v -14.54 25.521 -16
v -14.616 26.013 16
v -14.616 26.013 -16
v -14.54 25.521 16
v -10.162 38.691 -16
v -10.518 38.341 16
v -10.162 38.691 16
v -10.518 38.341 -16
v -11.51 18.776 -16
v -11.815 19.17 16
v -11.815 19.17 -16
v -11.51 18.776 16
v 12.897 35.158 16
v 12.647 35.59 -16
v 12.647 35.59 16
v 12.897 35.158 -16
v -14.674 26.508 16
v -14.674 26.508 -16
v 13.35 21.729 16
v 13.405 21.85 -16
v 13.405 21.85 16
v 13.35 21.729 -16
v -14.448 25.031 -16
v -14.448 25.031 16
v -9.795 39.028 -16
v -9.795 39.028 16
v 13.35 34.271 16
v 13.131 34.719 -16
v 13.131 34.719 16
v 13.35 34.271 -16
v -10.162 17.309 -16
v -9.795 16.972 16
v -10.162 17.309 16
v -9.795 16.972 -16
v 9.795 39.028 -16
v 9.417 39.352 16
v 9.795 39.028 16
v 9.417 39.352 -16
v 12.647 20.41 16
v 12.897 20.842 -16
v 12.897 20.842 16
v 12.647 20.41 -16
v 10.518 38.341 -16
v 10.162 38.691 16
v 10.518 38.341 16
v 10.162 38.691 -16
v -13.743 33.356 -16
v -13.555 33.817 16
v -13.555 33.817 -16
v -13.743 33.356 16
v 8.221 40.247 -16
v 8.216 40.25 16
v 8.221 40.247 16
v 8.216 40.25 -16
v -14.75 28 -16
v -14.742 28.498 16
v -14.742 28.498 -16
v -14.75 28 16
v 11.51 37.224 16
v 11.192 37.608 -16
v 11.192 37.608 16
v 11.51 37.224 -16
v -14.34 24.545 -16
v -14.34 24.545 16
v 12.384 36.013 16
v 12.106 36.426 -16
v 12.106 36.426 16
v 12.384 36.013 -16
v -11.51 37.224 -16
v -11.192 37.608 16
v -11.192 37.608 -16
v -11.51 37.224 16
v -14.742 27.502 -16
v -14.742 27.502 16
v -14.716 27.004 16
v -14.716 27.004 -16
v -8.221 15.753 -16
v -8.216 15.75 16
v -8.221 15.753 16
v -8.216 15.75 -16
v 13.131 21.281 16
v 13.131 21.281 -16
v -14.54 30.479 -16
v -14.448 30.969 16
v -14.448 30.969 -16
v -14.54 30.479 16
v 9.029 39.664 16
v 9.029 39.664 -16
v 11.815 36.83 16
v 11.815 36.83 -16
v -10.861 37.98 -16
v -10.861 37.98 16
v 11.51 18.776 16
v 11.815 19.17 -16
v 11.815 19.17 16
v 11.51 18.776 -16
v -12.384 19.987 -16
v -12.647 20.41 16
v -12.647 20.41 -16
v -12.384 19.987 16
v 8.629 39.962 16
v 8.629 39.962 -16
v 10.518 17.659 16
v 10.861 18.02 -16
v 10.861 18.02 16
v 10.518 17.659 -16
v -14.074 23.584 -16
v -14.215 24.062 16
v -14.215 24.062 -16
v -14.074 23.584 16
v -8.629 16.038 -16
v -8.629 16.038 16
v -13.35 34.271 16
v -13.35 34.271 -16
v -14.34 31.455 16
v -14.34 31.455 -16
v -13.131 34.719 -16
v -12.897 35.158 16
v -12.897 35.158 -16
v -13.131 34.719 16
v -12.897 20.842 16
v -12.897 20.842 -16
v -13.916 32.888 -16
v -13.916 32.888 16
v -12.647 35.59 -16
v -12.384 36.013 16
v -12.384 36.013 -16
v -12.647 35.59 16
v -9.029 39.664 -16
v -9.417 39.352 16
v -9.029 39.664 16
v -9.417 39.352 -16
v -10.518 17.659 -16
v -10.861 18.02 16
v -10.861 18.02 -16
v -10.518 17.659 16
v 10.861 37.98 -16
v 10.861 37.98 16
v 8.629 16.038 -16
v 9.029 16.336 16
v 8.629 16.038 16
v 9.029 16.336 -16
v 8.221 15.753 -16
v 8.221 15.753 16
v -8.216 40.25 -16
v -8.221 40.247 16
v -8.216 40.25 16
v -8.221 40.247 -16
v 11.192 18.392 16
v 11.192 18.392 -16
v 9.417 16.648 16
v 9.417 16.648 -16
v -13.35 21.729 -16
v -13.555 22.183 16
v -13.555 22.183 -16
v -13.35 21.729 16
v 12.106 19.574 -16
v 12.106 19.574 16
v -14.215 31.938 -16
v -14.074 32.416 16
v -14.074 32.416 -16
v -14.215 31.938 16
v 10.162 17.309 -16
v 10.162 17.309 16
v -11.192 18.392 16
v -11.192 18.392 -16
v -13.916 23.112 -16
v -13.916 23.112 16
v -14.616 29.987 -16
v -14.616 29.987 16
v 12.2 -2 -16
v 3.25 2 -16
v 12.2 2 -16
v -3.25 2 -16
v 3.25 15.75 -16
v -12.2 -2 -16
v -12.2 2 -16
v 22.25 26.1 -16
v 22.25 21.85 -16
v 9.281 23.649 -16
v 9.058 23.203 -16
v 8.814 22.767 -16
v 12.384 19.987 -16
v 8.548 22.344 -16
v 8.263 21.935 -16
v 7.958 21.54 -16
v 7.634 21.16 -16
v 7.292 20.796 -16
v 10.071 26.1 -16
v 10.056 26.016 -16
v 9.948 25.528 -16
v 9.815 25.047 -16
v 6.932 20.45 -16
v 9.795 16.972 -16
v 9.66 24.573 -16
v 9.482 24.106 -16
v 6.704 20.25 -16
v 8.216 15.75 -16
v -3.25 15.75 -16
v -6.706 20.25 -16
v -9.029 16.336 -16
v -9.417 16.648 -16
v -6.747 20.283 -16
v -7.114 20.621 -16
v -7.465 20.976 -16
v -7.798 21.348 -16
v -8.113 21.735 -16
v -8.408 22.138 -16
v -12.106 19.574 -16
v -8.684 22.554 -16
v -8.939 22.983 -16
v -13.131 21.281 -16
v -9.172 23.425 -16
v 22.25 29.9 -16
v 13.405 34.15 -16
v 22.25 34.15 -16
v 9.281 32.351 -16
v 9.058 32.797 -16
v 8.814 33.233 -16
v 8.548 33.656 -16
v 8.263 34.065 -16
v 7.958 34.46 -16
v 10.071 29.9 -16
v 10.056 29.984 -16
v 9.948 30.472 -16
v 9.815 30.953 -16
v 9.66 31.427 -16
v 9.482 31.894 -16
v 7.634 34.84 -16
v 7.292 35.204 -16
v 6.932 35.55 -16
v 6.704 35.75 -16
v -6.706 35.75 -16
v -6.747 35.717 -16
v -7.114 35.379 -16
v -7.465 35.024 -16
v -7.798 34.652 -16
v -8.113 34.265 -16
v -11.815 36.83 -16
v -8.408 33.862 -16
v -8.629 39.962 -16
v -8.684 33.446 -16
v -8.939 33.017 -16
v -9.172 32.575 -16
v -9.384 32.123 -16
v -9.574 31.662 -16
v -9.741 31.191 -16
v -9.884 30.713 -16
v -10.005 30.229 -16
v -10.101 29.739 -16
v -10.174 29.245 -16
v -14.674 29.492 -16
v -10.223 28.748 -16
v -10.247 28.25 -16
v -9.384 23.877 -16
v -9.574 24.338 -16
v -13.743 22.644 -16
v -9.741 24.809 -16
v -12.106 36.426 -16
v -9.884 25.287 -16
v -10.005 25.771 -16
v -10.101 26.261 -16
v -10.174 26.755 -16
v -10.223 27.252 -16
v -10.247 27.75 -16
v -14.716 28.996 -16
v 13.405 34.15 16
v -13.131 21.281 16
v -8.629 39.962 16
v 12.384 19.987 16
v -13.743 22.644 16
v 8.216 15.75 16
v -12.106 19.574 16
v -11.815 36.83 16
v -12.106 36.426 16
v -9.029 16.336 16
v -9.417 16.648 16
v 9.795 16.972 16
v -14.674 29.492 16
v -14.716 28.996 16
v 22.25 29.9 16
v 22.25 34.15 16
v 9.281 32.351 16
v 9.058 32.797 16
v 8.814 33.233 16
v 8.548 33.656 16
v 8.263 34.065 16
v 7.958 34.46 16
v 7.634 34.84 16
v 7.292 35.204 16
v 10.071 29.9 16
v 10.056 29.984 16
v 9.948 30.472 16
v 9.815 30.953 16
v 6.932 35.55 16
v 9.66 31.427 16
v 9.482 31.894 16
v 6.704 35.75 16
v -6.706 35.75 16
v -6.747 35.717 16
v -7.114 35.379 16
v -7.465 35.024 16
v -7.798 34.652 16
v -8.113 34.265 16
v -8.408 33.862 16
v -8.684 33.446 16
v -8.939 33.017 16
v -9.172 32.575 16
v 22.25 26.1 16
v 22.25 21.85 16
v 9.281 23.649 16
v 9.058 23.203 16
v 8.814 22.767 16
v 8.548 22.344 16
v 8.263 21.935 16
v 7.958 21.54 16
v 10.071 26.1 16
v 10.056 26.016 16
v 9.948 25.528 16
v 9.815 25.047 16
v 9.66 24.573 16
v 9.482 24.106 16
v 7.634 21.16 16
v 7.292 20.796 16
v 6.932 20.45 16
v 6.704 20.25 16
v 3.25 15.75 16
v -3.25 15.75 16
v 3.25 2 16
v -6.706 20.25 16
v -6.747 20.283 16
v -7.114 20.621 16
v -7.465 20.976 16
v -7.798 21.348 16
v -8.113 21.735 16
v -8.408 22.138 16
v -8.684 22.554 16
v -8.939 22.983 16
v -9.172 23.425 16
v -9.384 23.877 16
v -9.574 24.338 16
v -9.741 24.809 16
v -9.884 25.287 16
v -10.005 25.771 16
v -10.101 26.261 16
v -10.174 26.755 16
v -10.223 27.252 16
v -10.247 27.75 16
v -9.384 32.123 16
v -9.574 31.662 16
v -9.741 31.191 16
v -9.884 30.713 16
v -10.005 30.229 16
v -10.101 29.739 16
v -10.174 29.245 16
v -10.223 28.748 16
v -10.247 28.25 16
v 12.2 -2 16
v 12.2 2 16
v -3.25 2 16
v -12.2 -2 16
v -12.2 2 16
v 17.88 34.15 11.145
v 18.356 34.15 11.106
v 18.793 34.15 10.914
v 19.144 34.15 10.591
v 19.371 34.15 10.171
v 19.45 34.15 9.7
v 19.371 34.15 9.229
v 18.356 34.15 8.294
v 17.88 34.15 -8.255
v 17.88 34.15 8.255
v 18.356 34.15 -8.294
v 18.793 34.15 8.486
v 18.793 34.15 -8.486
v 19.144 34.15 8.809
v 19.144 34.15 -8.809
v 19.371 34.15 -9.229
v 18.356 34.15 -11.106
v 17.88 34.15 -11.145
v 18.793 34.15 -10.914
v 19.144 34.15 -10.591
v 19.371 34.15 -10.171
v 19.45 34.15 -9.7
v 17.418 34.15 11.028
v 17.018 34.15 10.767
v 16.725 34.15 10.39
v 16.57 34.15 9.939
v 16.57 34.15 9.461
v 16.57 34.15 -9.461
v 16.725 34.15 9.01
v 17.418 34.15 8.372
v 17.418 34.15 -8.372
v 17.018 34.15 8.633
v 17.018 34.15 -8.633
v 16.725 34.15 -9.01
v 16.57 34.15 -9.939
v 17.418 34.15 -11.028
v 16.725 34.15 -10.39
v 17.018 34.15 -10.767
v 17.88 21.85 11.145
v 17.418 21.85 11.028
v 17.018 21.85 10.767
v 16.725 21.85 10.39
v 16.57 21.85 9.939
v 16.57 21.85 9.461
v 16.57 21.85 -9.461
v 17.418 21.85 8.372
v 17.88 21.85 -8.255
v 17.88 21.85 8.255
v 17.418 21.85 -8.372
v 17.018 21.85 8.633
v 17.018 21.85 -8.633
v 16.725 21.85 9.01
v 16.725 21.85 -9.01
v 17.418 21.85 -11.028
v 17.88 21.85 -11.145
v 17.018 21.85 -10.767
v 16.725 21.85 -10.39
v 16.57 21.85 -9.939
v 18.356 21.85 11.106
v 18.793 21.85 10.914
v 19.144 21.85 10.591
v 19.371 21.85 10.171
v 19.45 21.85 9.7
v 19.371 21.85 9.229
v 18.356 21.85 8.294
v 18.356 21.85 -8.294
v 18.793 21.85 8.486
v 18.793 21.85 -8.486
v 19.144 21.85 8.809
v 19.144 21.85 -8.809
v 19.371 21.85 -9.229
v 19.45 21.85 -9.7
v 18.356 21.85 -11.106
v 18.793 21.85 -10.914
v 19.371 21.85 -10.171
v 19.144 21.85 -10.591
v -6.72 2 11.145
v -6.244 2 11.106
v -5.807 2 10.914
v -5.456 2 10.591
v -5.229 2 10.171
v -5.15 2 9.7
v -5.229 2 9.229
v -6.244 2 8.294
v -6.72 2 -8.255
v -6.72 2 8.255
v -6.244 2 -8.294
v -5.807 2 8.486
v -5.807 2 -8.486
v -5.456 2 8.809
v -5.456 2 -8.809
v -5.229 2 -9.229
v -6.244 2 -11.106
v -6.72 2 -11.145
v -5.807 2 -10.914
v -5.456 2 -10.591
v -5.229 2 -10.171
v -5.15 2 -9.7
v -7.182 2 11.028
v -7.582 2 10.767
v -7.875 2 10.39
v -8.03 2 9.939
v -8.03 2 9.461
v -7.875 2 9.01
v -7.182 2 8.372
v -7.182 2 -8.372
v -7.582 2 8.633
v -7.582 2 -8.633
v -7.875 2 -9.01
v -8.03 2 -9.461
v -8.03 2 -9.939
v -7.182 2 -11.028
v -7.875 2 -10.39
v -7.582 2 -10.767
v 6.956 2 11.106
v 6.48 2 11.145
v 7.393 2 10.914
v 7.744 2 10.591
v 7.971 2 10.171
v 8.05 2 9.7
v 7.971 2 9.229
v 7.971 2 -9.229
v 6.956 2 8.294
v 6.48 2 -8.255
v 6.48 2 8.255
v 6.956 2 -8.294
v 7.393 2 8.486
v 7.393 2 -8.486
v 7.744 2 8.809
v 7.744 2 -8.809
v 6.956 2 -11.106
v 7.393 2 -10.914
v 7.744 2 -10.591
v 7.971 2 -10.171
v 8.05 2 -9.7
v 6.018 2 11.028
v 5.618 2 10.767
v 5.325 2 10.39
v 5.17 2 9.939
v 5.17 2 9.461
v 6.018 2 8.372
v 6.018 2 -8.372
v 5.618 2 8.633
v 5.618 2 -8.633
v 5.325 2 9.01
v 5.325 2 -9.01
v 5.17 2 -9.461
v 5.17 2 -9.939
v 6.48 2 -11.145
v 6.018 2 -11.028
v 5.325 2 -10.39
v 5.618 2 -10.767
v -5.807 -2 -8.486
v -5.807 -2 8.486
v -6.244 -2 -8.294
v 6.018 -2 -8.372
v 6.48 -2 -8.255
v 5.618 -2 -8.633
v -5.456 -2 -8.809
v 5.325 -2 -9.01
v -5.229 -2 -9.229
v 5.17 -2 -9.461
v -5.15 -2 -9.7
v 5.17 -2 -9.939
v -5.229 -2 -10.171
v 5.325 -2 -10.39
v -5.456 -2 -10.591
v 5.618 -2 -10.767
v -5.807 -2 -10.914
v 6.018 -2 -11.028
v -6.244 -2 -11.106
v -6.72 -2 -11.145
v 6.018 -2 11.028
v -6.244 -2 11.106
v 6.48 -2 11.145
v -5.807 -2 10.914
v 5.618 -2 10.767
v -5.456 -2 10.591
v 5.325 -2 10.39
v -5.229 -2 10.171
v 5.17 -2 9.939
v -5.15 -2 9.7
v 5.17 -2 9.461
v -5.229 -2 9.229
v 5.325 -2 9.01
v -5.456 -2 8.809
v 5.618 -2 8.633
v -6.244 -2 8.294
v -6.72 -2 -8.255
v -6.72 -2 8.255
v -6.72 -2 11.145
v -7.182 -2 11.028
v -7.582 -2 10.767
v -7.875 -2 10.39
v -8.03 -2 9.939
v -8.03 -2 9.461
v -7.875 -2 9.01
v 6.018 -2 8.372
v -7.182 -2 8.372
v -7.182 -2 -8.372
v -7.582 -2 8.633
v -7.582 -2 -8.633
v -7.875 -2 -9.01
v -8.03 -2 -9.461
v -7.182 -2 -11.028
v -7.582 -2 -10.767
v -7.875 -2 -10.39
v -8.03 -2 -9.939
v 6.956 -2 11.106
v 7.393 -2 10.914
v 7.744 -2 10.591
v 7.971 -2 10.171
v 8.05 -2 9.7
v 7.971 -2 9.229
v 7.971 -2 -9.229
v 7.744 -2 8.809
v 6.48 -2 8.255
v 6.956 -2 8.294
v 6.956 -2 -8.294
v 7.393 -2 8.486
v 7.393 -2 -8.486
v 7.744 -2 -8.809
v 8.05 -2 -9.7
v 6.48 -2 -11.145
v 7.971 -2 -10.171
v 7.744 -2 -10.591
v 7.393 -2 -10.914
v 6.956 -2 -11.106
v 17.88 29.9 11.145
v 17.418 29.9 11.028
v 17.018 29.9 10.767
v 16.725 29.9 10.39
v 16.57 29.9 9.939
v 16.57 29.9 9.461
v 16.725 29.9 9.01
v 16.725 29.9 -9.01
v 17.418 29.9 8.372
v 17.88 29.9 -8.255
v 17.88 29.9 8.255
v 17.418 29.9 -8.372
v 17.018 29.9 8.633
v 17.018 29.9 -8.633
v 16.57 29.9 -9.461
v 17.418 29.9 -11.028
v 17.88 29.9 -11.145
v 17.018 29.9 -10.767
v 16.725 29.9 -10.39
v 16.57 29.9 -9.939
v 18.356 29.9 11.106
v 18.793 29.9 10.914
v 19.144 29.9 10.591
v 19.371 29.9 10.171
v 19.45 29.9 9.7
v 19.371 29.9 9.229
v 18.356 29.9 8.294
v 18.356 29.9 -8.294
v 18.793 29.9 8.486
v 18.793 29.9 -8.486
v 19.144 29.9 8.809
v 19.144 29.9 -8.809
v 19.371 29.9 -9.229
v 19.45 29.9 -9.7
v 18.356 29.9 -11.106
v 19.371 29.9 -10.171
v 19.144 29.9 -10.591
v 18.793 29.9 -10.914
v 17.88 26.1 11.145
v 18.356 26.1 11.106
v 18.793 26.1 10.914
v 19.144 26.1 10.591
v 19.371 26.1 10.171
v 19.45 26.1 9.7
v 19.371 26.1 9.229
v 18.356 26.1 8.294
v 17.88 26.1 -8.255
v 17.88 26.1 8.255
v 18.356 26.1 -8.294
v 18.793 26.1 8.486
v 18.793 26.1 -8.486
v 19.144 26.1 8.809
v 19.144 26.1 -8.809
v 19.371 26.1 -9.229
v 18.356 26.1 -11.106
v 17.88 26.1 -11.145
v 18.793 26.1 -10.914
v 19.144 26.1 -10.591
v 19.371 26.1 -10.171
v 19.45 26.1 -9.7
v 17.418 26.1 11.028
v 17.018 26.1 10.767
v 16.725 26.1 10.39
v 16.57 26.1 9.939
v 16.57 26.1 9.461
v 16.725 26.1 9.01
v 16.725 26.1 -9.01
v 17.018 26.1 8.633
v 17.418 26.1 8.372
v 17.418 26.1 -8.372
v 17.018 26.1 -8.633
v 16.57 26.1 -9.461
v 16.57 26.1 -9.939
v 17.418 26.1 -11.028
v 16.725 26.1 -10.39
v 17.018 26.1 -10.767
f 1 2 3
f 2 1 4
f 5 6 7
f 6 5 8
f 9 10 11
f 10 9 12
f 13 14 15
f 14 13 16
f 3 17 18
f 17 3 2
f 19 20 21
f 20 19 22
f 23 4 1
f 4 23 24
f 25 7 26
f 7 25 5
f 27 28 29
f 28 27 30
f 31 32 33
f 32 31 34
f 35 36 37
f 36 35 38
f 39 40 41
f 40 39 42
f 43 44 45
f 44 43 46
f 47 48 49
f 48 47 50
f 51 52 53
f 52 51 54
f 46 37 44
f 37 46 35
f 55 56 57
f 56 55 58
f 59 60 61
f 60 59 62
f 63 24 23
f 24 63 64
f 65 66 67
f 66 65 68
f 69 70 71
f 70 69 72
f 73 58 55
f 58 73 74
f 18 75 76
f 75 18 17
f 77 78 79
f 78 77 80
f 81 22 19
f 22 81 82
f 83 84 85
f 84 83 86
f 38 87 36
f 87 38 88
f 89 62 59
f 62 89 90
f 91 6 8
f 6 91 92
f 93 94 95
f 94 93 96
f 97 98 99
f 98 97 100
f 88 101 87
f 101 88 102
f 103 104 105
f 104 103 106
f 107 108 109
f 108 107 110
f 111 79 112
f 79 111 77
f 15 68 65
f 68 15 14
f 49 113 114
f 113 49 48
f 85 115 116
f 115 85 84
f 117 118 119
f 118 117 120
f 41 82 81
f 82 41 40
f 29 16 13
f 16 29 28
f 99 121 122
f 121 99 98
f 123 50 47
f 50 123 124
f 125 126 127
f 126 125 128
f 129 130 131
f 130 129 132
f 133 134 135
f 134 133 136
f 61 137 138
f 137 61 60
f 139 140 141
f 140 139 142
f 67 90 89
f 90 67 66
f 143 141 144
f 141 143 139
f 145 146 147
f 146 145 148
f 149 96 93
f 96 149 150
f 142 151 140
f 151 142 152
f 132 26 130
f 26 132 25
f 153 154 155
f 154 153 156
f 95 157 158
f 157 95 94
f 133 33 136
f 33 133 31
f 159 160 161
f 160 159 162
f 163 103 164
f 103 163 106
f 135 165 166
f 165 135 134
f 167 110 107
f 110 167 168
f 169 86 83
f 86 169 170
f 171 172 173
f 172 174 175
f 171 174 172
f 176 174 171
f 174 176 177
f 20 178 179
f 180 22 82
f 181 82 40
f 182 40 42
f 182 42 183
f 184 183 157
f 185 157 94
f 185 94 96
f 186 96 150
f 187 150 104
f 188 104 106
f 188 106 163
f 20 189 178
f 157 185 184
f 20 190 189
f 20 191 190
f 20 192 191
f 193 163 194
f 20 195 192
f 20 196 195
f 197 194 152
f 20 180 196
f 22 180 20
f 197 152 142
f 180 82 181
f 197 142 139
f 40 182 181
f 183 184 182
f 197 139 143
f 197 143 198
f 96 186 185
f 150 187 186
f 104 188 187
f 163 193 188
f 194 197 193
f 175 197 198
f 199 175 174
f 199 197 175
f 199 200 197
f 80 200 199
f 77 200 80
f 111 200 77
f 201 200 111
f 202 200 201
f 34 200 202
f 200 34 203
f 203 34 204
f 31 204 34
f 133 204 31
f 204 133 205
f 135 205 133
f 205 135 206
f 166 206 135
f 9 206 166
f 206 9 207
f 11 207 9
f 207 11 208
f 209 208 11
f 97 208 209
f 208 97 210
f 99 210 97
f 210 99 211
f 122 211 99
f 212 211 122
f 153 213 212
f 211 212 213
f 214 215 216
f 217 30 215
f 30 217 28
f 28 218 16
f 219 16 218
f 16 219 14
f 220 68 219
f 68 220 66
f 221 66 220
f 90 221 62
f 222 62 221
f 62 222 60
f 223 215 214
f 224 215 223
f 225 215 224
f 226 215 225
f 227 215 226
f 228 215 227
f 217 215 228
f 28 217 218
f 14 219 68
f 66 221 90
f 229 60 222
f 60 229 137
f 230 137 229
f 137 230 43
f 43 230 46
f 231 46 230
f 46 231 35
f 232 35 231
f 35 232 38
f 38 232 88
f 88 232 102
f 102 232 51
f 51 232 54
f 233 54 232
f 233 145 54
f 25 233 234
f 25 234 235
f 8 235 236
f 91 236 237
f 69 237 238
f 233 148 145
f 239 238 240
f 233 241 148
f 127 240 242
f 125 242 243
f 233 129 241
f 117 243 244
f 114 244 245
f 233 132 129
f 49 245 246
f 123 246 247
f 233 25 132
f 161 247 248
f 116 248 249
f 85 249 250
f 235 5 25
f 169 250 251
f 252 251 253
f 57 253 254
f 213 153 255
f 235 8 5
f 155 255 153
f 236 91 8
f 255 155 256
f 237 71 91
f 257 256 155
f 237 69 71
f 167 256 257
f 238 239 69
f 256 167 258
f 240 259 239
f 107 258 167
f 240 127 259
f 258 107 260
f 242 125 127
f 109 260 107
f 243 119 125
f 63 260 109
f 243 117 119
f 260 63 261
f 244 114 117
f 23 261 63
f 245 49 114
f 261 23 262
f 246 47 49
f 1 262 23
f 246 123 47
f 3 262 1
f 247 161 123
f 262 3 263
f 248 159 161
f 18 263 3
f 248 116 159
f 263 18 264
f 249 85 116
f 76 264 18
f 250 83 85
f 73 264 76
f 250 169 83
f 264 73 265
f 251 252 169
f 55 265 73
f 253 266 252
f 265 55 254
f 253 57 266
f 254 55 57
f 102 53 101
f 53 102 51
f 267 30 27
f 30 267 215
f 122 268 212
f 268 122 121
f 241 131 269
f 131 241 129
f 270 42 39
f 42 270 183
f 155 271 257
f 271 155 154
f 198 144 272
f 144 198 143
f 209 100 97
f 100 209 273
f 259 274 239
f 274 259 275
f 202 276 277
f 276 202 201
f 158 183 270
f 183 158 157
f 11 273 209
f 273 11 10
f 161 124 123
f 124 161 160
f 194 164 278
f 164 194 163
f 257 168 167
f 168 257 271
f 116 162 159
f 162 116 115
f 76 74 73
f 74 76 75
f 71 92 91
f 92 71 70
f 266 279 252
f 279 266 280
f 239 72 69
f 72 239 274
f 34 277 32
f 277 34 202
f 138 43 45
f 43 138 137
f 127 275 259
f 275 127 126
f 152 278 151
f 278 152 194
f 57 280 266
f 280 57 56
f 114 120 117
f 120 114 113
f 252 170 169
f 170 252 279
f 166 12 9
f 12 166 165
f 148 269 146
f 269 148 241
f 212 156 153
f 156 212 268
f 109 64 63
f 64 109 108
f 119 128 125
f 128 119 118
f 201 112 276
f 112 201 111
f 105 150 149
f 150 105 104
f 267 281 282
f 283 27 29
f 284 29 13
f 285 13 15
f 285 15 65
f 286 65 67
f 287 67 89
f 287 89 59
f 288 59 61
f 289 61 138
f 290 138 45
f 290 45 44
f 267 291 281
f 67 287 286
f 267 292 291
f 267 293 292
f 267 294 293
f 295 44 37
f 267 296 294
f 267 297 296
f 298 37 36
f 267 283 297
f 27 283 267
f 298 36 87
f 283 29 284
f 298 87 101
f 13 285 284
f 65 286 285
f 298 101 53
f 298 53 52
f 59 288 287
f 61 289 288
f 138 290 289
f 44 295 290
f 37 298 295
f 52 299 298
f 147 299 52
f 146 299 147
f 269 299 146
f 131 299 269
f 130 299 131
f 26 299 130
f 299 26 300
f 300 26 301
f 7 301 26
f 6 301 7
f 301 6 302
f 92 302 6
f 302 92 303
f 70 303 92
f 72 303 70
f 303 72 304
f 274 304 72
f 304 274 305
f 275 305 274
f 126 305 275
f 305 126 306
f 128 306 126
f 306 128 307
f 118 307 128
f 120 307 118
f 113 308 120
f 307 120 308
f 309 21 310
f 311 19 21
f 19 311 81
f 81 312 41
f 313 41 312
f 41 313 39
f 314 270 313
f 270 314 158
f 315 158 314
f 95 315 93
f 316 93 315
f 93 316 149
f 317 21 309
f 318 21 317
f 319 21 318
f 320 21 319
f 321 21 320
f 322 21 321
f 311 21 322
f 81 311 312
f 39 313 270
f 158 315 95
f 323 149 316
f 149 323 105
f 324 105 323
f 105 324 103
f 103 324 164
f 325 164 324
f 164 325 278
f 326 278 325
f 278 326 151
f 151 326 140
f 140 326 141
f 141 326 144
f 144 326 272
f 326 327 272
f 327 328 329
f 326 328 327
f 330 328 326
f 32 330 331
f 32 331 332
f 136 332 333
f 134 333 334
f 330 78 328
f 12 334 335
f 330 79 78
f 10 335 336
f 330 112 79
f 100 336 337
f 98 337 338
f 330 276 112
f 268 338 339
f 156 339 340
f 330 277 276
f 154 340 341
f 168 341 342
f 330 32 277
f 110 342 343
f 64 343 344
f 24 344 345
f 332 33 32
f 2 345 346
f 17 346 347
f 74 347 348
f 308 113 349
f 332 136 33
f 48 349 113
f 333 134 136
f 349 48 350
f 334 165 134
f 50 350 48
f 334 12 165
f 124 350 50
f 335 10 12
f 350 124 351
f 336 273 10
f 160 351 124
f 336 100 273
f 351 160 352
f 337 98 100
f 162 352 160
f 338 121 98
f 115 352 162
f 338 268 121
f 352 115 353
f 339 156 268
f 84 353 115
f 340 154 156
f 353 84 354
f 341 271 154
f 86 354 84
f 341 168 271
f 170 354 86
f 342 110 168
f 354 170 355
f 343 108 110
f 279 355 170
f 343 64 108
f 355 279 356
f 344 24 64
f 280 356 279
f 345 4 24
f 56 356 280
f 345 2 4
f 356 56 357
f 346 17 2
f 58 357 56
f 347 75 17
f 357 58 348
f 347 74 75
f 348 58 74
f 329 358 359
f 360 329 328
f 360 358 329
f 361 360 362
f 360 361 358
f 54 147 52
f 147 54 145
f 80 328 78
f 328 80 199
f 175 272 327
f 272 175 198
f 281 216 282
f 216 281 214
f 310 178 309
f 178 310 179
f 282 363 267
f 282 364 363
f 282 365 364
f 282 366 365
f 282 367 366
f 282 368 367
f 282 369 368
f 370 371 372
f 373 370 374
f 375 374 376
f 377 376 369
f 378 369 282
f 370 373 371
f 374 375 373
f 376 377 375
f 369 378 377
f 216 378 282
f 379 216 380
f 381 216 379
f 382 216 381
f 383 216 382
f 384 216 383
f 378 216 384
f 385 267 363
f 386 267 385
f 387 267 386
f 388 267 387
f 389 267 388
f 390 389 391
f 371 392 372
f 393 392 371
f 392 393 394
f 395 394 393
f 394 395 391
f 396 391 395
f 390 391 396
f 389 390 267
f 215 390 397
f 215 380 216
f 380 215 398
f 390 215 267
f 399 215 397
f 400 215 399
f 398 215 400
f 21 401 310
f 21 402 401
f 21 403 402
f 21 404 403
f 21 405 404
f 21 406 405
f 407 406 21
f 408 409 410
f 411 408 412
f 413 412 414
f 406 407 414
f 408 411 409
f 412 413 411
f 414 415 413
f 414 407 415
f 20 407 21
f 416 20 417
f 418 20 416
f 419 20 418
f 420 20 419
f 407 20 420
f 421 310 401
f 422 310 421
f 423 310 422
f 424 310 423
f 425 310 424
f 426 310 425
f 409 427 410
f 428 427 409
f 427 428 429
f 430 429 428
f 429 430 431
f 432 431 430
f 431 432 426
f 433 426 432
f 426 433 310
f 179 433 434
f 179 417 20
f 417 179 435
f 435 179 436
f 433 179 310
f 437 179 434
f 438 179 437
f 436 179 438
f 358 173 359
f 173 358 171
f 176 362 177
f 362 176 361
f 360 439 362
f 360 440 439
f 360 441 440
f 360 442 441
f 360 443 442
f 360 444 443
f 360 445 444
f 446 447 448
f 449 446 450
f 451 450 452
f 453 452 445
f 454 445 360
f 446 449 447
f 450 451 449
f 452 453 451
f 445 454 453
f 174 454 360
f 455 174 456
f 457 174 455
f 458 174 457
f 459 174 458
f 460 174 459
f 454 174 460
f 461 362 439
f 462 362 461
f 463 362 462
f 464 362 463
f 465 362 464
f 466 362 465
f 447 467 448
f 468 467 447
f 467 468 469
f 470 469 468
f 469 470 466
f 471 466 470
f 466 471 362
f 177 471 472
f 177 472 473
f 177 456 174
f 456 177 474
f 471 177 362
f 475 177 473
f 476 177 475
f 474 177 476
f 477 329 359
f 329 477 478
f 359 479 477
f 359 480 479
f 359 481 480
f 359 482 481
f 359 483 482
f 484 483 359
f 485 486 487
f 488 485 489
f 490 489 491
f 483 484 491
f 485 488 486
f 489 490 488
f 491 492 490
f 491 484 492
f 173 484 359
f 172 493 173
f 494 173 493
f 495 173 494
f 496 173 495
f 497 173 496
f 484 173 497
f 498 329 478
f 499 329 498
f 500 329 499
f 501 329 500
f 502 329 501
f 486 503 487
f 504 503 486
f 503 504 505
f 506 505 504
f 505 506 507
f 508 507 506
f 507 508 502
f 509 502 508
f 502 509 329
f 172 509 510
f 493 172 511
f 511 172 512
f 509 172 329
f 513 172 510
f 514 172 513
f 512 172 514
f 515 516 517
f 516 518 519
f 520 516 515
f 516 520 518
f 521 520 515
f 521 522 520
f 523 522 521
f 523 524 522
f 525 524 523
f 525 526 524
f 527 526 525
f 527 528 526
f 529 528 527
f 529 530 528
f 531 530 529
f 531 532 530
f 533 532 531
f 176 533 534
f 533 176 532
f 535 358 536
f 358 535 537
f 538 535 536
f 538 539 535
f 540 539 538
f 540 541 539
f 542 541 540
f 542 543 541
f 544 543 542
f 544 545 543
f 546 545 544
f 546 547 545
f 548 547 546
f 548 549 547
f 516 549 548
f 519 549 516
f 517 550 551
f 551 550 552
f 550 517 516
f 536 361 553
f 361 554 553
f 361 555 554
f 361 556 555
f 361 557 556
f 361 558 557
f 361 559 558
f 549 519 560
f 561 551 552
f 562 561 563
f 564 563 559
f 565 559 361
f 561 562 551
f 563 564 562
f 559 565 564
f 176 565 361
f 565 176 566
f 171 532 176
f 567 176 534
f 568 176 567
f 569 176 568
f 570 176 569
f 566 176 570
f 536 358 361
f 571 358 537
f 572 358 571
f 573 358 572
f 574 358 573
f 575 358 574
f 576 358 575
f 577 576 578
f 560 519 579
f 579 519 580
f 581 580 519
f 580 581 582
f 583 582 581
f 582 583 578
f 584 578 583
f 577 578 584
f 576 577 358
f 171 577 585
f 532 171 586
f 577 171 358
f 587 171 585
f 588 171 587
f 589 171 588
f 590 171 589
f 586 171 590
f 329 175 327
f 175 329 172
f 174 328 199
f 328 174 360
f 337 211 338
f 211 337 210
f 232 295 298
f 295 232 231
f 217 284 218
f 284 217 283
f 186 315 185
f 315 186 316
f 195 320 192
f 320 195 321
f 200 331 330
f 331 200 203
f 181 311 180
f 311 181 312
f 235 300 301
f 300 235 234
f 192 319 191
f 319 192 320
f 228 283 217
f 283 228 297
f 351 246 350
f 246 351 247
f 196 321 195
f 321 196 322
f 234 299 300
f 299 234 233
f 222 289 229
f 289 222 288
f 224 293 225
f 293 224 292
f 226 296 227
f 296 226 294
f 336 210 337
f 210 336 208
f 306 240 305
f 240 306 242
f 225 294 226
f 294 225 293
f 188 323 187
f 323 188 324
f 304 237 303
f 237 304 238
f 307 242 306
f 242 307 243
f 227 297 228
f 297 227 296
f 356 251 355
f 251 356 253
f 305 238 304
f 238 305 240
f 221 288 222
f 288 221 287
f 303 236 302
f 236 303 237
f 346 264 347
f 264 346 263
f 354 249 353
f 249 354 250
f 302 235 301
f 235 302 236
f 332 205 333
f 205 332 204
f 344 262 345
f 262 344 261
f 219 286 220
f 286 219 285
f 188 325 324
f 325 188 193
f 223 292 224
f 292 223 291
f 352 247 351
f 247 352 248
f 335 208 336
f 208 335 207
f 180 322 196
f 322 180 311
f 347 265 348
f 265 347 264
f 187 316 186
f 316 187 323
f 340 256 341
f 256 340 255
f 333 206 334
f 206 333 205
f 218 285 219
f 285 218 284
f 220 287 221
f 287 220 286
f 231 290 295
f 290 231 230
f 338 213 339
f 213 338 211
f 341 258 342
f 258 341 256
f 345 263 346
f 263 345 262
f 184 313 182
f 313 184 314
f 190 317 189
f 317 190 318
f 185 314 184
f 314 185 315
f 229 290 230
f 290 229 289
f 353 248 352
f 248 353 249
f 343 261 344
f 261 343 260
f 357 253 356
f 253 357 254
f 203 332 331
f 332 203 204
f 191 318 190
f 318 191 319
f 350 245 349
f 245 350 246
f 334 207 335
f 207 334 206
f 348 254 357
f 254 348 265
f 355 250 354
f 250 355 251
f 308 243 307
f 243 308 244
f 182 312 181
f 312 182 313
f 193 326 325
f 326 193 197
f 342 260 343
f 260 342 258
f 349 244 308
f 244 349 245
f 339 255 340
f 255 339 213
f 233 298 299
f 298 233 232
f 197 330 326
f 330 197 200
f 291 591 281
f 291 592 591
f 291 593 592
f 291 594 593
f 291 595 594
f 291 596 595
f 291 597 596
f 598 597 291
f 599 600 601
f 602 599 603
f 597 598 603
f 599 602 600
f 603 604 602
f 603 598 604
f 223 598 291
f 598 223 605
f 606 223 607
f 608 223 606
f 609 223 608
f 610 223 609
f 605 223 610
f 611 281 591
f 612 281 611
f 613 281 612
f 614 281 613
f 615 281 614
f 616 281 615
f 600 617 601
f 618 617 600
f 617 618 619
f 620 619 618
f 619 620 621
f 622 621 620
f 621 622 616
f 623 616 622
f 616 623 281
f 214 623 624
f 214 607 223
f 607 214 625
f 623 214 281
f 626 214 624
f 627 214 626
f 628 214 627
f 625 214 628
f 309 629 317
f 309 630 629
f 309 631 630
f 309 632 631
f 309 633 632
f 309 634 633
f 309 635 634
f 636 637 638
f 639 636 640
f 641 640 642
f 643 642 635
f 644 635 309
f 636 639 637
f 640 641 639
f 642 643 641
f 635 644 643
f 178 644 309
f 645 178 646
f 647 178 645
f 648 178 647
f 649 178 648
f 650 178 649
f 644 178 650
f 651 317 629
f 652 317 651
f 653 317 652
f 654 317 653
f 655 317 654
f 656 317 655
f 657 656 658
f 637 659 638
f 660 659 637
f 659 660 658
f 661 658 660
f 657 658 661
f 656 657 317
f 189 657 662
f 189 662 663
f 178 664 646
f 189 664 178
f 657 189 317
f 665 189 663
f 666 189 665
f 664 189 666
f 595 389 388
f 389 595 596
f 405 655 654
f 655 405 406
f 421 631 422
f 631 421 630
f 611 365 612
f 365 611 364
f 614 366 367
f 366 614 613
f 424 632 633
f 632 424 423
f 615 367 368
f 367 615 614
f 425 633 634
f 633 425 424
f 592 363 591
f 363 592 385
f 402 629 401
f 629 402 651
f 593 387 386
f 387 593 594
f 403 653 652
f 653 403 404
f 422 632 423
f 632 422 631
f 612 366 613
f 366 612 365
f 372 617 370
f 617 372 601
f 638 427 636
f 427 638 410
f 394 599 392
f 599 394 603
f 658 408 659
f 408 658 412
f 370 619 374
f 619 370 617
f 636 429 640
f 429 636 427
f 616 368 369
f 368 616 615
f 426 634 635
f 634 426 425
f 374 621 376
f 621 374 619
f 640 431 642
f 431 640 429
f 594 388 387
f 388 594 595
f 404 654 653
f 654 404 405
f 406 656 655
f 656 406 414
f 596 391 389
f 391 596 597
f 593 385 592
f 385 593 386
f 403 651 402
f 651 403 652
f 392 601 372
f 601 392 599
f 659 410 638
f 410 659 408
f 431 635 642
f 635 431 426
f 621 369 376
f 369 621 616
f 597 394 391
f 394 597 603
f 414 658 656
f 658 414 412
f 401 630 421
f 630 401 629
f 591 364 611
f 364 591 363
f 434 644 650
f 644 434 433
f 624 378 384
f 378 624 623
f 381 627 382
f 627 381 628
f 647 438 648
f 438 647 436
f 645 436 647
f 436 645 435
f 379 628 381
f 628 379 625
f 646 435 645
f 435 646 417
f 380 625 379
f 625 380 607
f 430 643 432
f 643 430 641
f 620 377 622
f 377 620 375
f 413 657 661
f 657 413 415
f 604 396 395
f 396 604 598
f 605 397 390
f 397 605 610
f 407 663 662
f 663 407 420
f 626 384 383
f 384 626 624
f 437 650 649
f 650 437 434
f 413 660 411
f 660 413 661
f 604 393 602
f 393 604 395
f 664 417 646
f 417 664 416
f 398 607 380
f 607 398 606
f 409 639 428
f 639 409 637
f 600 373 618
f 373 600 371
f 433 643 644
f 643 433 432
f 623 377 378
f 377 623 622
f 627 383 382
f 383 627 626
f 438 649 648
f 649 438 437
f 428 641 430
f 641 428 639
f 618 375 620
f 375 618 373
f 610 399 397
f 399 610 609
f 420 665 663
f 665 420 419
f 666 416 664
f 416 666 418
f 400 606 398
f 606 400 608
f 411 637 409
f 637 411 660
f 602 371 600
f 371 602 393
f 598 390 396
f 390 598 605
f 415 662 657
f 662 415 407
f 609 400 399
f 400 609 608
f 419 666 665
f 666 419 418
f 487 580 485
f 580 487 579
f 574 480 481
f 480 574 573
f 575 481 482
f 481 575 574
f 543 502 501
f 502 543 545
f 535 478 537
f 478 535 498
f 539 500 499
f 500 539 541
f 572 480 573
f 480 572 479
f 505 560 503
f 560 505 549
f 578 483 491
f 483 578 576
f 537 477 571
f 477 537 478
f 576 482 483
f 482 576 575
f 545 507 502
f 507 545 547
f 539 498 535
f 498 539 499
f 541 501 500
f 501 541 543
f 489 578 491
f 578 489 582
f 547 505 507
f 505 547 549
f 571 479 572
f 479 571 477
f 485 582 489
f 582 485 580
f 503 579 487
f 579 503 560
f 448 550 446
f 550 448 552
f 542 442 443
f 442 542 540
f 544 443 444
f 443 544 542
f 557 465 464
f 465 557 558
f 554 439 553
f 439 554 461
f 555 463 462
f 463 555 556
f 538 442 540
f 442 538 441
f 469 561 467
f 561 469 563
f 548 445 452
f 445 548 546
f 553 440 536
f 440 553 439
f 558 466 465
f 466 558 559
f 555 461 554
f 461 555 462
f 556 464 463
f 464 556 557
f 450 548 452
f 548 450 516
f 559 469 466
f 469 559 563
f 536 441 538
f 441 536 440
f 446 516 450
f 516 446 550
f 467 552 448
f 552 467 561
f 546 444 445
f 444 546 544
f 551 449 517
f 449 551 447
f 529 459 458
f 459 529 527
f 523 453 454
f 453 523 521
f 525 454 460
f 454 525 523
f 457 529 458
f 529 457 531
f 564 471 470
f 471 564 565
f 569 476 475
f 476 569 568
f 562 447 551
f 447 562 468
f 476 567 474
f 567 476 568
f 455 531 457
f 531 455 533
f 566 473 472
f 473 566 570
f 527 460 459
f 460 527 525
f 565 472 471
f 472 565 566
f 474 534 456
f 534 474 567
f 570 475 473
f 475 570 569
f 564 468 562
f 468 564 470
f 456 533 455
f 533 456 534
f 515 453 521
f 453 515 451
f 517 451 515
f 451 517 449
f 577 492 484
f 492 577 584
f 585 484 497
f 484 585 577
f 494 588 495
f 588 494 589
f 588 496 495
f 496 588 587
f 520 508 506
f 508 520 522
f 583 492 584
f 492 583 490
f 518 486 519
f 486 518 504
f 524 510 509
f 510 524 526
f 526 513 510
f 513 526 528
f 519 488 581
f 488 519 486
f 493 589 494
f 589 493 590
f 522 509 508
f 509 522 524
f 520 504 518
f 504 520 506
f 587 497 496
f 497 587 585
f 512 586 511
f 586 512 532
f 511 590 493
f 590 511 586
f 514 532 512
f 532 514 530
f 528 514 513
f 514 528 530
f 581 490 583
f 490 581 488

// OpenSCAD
motor_d = 20.5;
motor = 15.5;
h = 32;
hole_h =19.4;

hole_distance = 13.2;
hole_d = 2.9;
rounding = false;

$fn=0;
$fa=.01;
$fs=$preview ? 2 : .5;


 module offset_3d(r=1, size=1e12) {
     n = ($fs==undef || $preview) ? 3: $fs;
     if(r==0) children();
     else 
         if( r>0 )
             minkowski(){
                 children();
                 sphere(r, $fs=n);
             }
         else {
             size2 = size*[1,1,1];
             size1 = size2*0.99;
             difference(){
                 cube(size2, center=true);
                 minkowski(){
                     difference(){
                         cube(size1, center=true);
                         children();
                     }
                     sphere(-r, $fs=n);
                 }
             }
         }
}
 
module fillet(r=1.5) {
	if ($preview || ! rounding) {
		children();
	} else {
	offset_3d(r) offset_3d(-r) // exterior fillets
         offset_3d(-r) offset_3d(r)  // interior fillets
	 render() children();
	}
	
}


module motor(motor_d, motor, h) {
	intersection() {
		cylinder(d=motor_d, h = h, center = true);
		cube([motor_d, motor, h], center = true);
	}
}


difference() {

	fillet() {
		cube([24.4,4,h], center = true);
		translate([0,10,0]) cube([6.5,20,h], center = true);
		translate([0,28,0]) {
			motor(motor_d + 9, motor + 9, h);
			translate([6+motor_d/2,0,0]) cube([12, 12.3, h],center = true);
		}
	}

	translate([hole_distance/2, 0, hole_h/2]) rotate([90,0,0]) cylinder(d=hole_d, h = 10, center = true);
	translate([-hole_distance/2, 0, hole_h/2]) rotate([90,0,0]) cylinder(d=hole_d, h = 10, center = true);
	translate([-hole_distance/2, 0, -hole_h/2]) rotate([90,0,0]) cylinder(d=hole_d, h = 10, center = true);
	translate([hole_distance/2, 0, -hole_h/2]) rotate([90,0,0]) cylinder(d=hole_d, h = 10, center = true);

	translate([0,28,0]) {
		motor(motor_d, motor, 100);
		translate([30/2,0,0]) cube([30, 3.8, h+2], center = true);
		translate([18, 0, hole_h/2]) rotate([90,0,0]) cylinder(d=hole_d, h = 50, center = true);
		translate([18, 0, -hole_h/2]) rotate([90,0,0]) cylinder(d=hole_d, h = 50, center = true);
	}

}
